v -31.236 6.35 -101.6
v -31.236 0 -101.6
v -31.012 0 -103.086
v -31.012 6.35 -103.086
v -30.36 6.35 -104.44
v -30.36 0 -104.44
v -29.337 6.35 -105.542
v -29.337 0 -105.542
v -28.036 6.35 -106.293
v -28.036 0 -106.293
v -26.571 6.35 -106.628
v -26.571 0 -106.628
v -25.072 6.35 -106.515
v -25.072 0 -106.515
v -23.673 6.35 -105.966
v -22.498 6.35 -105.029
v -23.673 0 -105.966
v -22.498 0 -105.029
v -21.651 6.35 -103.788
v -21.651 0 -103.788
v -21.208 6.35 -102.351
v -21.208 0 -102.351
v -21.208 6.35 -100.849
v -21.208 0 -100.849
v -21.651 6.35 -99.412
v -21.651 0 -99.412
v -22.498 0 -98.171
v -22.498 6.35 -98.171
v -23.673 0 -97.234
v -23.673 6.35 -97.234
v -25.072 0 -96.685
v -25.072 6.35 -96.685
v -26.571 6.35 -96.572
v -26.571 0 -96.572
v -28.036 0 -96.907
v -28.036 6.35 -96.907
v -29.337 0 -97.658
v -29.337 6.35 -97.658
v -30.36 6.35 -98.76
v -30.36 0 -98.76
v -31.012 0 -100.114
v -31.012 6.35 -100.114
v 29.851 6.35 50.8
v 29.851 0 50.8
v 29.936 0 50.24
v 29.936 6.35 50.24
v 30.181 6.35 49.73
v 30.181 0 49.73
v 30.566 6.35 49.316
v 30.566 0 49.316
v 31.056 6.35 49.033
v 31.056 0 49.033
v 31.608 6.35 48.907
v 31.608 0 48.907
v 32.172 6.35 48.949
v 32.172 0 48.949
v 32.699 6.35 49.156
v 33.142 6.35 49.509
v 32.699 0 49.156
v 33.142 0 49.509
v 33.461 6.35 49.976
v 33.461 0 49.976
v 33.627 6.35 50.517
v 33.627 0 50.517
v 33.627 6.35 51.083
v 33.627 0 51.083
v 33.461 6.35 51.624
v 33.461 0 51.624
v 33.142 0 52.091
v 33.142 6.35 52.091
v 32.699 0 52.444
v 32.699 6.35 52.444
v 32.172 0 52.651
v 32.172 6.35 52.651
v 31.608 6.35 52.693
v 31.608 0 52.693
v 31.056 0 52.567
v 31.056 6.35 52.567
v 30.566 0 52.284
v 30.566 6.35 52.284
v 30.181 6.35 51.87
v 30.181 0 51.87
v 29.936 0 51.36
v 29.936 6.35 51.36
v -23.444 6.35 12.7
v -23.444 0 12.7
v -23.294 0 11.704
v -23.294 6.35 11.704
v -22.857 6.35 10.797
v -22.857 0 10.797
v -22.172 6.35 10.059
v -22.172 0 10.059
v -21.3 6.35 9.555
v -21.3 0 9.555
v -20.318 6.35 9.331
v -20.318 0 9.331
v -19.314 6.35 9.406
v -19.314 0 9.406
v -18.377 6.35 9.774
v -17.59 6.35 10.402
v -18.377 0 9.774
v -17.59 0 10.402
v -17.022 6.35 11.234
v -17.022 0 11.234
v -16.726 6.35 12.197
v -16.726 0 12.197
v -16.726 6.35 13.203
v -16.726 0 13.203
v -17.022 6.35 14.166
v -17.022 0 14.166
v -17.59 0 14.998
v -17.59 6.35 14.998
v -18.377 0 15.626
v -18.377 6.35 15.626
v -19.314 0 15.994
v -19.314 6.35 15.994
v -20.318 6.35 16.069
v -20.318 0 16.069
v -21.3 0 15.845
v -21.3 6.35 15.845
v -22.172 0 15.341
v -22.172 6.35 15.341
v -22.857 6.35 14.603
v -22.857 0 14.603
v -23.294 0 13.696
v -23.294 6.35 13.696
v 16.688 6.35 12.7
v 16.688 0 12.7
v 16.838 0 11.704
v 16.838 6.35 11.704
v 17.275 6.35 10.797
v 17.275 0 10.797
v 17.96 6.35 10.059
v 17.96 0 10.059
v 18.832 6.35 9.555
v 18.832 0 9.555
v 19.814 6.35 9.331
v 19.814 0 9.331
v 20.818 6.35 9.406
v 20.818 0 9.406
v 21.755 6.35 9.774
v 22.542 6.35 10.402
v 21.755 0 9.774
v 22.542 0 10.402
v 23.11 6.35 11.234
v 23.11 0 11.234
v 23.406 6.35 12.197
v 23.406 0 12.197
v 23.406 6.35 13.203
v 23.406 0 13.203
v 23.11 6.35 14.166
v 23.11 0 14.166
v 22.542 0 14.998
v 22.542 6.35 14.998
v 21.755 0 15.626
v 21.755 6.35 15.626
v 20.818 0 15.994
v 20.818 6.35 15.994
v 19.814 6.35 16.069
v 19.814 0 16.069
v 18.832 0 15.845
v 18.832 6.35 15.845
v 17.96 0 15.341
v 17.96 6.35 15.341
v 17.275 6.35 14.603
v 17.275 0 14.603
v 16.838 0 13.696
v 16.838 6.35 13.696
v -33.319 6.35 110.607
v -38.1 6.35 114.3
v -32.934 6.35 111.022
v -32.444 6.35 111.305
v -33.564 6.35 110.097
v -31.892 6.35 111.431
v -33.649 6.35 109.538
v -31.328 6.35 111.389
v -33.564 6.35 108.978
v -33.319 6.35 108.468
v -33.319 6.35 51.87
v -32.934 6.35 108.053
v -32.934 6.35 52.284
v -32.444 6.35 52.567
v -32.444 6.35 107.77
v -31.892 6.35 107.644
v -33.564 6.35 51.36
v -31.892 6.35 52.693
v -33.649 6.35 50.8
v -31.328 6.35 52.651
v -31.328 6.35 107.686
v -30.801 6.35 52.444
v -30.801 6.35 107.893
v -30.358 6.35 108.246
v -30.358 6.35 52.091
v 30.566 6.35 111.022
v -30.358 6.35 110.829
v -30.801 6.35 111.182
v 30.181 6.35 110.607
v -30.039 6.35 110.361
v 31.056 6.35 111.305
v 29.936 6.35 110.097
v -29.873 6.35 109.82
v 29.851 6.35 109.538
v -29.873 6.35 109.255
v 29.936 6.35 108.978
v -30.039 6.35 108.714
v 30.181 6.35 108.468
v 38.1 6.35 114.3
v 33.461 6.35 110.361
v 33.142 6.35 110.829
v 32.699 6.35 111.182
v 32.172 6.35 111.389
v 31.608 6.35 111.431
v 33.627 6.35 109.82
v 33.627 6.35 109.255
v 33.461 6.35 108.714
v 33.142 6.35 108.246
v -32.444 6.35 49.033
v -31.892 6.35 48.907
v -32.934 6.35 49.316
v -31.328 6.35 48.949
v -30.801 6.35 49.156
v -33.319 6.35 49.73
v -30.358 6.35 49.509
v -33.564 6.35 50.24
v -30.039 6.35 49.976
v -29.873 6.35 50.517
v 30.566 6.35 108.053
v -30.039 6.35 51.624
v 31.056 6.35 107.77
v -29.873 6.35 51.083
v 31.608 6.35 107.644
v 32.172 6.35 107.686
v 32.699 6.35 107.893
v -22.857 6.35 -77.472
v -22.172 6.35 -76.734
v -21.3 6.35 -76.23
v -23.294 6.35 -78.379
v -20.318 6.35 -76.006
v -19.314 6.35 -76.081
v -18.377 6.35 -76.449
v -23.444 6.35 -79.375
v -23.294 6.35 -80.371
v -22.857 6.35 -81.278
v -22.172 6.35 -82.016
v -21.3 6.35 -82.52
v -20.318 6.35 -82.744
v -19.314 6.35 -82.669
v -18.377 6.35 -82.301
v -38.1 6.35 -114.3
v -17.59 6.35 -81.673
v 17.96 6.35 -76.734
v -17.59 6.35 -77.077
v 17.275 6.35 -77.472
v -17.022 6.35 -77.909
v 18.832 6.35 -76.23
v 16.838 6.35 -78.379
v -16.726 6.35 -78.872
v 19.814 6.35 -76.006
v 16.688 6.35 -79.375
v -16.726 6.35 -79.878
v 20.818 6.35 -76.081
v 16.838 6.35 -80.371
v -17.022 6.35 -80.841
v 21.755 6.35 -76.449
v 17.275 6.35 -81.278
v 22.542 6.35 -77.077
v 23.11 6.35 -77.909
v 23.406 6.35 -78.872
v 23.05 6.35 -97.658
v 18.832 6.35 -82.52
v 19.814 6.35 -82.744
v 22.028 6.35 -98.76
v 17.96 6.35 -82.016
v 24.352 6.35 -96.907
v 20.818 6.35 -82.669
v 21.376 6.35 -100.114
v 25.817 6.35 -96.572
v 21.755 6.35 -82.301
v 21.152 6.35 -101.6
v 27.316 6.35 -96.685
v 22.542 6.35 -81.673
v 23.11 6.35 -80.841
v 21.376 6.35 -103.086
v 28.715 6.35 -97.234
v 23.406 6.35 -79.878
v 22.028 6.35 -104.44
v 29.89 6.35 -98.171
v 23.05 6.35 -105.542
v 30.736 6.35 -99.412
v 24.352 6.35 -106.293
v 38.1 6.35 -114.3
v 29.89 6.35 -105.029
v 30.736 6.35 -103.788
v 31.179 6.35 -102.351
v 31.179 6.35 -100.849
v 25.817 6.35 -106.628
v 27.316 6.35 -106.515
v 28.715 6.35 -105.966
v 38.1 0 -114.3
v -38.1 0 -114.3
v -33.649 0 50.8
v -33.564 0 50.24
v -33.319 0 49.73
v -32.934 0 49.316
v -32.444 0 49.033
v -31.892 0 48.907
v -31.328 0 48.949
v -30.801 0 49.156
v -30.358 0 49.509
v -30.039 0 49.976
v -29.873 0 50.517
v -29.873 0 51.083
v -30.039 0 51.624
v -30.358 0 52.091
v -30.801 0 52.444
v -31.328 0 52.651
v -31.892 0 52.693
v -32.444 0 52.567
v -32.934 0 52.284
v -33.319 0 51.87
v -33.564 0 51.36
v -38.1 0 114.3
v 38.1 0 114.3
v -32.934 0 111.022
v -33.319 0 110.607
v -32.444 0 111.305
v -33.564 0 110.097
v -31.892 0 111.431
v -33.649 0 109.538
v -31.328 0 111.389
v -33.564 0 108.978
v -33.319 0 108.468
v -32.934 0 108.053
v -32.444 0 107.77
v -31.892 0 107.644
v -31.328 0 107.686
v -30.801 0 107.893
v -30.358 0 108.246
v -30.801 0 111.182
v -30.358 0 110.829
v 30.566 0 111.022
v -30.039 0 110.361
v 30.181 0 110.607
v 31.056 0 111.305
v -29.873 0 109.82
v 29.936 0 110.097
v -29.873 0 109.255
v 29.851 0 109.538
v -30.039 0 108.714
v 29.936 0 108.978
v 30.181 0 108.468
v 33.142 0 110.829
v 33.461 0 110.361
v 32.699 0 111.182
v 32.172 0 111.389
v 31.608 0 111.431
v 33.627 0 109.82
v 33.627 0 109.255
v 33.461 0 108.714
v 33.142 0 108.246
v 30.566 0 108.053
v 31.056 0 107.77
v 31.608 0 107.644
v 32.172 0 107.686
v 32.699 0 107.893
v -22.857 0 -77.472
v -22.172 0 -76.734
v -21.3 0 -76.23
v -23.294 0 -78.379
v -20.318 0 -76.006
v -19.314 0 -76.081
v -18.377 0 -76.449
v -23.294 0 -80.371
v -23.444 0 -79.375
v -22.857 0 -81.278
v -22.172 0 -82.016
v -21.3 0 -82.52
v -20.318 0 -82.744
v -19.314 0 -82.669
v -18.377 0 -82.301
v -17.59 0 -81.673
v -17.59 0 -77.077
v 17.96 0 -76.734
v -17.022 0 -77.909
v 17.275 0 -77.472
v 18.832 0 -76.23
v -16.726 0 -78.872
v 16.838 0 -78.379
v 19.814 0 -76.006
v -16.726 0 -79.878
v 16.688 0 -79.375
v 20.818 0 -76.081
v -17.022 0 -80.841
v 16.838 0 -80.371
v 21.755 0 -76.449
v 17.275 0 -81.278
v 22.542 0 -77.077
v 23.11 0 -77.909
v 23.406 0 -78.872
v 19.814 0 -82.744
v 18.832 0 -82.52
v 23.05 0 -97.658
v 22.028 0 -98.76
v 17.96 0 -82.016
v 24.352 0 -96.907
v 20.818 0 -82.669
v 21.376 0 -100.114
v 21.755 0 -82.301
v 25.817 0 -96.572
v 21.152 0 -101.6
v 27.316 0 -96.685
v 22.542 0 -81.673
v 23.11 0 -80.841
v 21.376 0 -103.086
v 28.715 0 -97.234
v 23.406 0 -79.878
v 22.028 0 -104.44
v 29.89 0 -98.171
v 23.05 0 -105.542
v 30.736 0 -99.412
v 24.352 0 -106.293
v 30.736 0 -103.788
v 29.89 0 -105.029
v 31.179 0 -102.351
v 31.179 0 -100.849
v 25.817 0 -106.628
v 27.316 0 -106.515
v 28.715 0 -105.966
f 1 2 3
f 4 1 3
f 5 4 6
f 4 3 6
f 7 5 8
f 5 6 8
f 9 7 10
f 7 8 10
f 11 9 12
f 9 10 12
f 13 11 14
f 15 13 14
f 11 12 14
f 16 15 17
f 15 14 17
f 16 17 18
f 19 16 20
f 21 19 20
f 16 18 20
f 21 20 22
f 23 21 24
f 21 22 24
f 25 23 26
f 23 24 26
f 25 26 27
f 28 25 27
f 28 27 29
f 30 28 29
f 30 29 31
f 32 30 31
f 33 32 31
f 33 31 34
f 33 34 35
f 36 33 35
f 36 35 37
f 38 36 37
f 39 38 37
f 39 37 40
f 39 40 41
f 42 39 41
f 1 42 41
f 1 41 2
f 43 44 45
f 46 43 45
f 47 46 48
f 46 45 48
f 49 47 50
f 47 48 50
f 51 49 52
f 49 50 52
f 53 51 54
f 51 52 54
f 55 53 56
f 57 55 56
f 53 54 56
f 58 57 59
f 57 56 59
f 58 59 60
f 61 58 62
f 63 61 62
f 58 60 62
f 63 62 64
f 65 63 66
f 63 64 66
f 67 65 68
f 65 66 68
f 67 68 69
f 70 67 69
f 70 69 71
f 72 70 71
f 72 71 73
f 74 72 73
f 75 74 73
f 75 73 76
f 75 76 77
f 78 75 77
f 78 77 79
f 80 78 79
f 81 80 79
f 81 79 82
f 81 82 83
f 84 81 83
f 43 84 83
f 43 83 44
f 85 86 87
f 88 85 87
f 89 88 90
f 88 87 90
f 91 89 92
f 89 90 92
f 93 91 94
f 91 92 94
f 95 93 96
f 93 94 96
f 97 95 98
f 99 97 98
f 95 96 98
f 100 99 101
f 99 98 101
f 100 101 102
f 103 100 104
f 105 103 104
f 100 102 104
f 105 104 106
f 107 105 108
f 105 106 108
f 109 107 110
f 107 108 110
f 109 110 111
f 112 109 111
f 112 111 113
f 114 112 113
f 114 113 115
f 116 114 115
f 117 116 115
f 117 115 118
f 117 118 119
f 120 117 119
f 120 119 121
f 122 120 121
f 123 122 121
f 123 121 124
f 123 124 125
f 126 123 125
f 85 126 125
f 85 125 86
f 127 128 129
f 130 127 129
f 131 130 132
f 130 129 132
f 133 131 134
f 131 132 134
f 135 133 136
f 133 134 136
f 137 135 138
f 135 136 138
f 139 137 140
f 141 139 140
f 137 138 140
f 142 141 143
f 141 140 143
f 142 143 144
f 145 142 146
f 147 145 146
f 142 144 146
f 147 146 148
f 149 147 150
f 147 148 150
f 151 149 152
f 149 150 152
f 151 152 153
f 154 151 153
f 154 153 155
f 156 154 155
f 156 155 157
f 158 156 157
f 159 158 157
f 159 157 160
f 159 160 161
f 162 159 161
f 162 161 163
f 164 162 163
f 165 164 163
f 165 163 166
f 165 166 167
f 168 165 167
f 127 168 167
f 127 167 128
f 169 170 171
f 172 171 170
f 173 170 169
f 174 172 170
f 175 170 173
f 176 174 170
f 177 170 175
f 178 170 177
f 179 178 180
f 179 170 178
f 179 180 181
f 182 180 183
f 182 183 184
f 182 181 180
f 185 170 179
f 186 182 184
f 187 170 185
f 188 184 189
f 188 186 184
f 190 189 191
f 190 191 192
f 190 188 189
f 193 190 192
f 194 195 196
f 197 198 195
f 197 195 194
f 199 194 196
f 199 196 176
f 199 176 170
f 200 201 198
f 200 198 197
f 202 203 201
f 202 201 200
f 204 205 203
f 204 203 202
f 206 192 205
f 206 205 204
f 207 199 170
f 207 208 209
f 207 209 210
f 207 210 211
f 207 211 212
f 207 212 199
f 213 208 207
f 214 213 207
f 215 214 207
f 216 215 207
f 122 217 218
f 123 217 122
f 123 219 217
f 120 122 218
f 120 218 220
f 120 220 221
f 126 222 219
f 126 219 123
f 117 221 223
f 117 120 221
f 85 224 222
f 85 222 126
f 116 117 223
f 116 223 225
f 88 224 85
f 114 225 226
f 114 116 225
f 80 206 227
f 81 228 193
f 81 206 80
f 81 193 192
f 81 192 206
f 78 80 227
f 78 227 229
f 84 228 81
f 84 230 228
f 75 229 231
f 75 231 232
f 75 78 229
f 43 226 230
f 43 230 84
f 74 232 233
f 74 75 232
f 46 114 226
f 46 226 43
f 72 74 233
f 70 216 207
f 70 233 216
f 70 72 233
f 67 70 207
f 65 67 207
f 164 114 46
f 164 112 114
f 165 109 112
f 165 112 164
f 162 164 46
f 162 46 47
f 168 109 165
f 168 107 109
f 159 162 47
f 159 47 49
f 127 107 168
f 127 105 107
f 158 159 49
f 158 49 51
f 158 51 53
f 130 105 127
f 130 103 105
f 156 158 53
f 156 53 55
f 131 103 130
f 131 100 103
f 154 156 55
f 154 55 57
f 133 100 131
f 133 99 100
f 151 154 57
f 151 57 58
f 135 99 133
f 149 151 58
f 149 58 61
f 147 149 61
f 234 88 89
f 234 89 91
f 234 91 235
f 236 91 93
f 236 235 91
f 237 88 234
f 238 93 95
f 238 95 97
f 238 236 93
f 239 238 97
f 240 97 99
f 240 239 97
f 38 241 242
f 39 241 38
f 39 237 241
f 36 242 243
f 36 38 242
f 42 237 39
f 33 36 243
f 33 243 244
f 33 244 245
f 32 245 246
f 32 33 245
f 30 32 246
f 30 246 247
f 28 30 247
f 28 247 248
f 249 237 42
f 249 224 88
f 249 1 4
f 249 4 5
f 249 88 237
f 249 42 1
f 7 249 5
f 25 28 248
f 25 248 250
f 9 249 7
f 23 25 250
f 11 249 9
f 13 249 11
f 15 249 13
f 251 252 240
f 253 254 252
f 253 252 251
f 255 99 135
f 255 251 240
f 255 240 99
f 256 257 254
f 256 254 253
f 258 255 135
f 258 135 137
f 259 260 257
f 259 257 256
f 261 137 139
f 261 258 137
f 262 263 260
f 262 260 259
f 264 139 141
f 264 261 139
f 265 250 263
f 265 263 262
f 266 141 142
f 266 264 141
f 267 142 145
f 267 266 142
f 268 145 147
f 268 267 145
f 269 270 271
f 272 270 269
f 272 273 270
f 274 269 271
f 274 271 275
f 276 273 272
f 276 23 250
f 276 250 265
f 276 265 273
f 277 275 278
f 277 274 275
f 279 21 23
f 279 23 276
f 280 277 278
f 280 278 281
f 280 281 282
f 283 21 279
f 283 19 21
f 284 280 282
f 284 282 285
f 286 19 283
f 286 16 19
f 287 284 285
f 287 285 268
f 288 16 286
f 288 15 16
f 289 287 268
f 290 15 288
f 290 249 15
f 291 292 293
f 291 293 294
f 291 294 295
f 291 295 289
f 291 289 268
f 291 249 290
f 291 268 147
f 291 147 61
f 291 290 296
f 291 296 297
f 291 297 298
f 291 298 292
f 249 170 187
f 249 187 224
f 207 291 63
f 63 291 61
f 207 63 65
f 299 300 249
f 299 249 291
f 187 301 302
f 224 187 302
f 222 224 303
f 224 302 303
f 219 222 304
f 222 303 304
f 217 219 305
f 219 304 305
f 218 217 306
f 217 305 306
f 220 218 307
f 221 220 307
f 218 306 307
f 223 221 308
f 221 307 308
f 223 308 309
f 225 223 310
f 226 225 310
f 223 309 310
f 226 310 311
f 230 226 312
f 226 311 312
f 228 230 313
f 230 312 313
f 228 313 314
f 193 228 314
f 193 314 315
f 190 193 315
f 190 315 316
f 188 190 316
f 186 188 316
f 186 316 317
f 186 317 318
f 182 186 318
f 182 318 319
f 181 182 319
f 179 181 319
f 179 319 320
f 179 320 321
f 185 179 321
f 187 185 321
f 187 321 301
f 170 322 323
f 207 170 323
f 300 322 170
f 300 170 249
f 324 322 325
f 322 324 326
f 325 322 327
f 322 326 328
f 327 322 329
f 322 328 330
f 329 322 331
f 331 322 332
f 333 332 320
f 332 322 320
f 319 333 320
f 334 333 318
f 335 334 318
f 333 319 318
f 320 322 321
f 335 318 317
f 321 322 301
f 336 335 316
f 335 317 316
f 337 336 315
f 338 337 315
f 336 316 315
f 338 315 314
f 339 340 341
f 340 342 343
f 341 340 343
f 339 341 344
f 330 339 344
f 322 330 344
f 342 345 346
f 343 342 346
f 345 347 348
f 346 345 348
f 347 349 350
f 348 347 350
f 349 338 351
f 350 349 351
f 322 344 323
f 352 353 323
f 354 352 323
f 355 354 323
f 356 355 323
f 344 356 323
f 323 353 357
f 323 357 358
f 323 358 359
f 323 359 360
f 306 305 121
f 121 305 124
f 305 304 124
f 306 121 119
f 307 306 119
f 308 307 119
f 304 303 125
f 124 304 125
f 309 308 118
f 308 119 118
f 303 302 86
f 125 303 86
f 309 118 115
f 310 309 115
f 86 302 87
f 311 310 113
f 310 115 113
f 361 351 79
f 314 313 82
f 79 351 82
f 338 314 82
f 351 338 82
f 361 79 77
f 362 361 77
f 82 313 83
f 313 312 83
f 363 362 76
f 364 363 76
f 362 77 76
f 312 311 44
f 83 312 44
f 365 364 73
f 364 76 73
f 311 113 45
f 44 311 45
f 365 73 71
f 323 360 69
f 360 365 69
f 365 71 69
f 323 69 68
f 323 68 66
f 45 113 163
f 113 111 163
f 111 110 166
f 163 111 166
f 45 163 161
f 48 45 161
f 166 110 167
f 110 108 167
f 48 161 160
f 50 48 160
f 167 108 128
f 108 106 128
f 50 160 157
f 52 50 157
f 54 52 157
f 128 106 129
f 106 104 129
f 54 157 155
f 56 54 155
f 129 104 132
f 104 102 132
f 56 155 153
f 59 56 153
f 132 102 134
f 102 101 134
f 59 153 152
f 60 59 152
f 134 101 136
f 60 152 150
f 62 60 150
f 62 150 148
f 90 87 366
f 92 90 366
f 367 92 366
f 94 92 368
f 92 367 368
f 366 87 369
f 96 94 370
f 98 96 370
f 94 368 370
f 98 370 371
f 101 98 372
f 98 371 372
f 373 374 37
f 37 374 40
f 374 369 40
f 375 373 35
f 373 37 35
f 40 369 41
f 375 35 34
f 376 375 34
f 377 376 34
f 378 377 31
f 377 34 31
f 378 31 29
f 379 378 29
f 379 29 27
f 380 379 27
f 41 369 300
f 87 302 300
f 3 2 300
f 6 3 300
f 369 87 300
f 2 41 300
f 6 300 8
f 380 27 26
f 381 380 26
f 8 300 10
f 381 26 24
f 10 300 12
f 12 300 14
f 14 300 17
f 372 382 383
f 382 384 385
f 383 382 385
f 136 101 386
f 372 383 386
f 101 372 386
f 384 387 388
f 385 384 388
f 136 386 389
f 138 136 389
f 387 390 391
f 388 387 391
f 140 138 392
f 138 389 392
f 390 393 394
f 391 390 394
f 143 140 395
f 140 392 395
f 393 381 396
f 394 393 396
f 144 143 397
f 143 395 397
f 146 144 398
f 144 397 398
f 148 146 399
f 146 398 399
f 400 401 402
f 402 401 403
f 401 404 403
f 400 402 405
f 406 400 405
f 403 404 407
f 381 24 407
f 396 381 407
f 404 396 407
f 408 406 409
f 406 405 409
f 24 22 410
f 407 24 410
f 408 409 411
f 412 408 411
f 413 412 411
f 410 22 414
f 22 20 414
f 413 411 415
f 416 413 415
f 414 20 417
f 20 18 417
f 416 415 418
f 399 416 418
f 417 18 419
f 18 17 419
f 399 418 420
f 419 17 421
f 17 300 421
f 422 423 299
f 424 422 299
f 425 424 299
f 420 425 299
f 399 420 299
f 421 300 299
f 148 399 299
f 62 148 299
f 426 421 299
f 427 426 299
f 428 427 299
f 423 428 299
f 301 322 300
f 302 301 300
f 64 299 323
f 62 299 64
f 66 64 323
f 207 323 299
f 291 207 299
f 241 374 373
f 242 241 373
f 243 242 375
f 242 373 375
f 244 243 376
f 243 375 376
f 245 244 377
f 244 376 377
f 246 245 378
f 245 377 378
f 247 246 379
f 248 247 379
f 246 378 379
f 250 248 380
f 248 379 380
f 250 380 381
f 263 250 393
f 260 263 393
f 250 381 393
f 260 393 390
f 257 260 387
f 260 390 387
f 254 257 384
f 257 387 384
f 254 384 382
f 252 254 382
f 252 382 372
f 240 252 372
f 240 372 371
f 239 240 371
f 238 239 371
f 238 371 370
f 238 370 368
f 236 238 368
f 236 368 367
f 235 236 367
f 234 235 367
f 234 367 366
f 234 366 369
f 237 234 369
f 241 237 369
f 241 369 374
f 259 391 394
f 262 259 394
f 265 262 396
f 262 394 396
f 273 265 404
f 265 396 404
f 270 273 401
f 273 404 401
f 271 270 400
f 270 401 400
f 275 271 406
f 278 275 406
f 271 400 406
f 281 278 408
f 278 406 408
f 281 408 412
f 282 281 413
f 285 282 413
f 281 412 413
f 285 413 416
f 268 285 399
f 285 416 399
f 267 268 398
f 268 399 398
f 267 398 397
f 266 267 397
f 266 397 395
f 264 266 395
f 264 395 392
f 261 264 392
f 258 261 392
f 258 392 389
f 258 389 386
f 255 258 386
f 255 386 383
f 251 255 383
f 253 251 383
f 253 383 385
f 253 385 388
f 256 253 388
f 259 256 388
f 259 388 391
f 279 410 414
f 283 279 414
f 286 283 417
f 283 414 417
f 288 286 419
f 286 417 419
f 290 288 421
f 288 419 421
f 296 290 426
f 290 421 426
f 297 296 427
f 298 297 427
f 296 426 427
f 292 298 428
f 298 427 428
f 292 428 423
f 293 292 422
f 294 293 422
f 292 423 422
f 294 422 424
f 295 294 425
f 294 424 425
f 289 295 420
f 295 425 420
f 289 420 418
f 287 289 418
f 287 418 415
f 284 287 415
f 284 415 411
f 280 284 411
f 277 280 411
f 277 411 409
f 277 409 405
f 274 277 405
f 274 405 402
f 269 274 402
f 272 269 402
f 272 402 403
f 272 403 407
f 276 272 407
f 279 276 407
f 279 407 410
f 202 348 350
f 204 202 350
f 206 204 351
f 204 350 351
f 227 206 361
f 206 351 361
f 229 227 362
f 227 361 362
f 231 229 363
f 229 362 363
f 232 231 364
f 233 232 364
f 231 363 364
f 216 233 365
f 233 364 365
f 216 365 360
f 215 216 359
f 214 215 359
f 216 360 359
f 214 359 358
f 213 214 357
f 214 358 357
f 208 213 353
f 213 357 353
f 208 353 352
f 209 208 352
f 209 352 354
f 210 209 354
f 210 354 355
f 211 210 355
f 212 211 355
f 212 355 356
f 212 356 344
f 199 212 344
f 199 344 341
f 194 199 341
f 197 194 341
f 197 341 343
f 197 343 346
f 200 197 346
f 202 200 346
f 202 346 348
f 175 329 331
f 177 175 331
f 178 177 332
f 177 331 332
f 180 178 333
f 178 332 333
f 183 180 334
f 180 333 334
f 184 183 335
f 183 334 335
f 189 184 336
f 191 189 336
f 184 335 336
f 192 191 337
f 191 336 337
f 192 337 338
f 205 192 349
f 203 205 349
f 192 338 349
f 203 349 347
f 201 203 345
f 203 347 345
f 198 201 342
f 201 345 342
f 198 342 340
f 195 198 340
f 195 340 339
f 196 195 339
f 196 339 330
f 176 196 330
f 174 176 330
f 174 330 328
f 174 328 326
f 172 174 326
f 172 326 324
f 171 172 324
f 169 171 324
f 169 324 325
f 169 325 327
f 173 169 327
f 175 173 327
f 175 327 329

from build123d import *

# Parameters (mm, degrees)
PLATE_SKETCH_W          = 76.2
PLATE_SKETCH_H          = 228.6
PLATE_EXTRUDE_DEPTH     = 6.35
F_1_4_CLEARANCE_HOLE2_D = 6.7564
F_6_CLEARANCE_HOLE1_D   = 3.7973
F_3_8_CLEARANCE_HOLE1_D = 10.0838


with BuildPart() as part:
    # Plate sketch → Plate extrude (new body)
    with BuildSketch(Plane(origin=(0, 0, 0), x_dir=(1, 0, 0), z_dir=(0, 1, 0))):
        Rectangle(PLATE_SKETCH_W, PLATE_SKETCH_H)
    extrude(amount=PLATE_EXTRUDE_DEPTH)

    # 1/4 Clearance Hole2 (through all)
    with Locations(Plane(origin=(0, 6.35, 0), x_dir=(1, 0, 0), z_dir=(0, 1, 0))):
        with Locations((-20.066, 79.375), (20.066, -12.7), (-20.066, -12.7), (20.066, 79.375)):
            Hole(F_1_4_CLEARANCE_HOLE2_D / 2)

    # #6 Clearance Hole1 (through all)
    with Locations(Plane(origin=(0, 6.35, 0), x_dir=(1, 0, 0), z_dir=(0, 1, 0))):
        with Locations((-31.75, -50.8), (-31.75, -109.5375), (31.75, -50.8), (31.75, -109.5375)):
            Hole(F_6_CLEARANCE_HOLE1_D / 2)

    # 3/8 Clearance Hole1 (through all)
    with Locations(Plane(origin=(0, 6.35, 0), x_dir=(1, 0, 0), z_dir=(0, 1, 0))):
        with Locations((-26.19375, 101.6), (26.19375, 101.6)):
            Hole(F_3_8_CLEARANCE_HOLE1_D / 2)


solid = part.part
